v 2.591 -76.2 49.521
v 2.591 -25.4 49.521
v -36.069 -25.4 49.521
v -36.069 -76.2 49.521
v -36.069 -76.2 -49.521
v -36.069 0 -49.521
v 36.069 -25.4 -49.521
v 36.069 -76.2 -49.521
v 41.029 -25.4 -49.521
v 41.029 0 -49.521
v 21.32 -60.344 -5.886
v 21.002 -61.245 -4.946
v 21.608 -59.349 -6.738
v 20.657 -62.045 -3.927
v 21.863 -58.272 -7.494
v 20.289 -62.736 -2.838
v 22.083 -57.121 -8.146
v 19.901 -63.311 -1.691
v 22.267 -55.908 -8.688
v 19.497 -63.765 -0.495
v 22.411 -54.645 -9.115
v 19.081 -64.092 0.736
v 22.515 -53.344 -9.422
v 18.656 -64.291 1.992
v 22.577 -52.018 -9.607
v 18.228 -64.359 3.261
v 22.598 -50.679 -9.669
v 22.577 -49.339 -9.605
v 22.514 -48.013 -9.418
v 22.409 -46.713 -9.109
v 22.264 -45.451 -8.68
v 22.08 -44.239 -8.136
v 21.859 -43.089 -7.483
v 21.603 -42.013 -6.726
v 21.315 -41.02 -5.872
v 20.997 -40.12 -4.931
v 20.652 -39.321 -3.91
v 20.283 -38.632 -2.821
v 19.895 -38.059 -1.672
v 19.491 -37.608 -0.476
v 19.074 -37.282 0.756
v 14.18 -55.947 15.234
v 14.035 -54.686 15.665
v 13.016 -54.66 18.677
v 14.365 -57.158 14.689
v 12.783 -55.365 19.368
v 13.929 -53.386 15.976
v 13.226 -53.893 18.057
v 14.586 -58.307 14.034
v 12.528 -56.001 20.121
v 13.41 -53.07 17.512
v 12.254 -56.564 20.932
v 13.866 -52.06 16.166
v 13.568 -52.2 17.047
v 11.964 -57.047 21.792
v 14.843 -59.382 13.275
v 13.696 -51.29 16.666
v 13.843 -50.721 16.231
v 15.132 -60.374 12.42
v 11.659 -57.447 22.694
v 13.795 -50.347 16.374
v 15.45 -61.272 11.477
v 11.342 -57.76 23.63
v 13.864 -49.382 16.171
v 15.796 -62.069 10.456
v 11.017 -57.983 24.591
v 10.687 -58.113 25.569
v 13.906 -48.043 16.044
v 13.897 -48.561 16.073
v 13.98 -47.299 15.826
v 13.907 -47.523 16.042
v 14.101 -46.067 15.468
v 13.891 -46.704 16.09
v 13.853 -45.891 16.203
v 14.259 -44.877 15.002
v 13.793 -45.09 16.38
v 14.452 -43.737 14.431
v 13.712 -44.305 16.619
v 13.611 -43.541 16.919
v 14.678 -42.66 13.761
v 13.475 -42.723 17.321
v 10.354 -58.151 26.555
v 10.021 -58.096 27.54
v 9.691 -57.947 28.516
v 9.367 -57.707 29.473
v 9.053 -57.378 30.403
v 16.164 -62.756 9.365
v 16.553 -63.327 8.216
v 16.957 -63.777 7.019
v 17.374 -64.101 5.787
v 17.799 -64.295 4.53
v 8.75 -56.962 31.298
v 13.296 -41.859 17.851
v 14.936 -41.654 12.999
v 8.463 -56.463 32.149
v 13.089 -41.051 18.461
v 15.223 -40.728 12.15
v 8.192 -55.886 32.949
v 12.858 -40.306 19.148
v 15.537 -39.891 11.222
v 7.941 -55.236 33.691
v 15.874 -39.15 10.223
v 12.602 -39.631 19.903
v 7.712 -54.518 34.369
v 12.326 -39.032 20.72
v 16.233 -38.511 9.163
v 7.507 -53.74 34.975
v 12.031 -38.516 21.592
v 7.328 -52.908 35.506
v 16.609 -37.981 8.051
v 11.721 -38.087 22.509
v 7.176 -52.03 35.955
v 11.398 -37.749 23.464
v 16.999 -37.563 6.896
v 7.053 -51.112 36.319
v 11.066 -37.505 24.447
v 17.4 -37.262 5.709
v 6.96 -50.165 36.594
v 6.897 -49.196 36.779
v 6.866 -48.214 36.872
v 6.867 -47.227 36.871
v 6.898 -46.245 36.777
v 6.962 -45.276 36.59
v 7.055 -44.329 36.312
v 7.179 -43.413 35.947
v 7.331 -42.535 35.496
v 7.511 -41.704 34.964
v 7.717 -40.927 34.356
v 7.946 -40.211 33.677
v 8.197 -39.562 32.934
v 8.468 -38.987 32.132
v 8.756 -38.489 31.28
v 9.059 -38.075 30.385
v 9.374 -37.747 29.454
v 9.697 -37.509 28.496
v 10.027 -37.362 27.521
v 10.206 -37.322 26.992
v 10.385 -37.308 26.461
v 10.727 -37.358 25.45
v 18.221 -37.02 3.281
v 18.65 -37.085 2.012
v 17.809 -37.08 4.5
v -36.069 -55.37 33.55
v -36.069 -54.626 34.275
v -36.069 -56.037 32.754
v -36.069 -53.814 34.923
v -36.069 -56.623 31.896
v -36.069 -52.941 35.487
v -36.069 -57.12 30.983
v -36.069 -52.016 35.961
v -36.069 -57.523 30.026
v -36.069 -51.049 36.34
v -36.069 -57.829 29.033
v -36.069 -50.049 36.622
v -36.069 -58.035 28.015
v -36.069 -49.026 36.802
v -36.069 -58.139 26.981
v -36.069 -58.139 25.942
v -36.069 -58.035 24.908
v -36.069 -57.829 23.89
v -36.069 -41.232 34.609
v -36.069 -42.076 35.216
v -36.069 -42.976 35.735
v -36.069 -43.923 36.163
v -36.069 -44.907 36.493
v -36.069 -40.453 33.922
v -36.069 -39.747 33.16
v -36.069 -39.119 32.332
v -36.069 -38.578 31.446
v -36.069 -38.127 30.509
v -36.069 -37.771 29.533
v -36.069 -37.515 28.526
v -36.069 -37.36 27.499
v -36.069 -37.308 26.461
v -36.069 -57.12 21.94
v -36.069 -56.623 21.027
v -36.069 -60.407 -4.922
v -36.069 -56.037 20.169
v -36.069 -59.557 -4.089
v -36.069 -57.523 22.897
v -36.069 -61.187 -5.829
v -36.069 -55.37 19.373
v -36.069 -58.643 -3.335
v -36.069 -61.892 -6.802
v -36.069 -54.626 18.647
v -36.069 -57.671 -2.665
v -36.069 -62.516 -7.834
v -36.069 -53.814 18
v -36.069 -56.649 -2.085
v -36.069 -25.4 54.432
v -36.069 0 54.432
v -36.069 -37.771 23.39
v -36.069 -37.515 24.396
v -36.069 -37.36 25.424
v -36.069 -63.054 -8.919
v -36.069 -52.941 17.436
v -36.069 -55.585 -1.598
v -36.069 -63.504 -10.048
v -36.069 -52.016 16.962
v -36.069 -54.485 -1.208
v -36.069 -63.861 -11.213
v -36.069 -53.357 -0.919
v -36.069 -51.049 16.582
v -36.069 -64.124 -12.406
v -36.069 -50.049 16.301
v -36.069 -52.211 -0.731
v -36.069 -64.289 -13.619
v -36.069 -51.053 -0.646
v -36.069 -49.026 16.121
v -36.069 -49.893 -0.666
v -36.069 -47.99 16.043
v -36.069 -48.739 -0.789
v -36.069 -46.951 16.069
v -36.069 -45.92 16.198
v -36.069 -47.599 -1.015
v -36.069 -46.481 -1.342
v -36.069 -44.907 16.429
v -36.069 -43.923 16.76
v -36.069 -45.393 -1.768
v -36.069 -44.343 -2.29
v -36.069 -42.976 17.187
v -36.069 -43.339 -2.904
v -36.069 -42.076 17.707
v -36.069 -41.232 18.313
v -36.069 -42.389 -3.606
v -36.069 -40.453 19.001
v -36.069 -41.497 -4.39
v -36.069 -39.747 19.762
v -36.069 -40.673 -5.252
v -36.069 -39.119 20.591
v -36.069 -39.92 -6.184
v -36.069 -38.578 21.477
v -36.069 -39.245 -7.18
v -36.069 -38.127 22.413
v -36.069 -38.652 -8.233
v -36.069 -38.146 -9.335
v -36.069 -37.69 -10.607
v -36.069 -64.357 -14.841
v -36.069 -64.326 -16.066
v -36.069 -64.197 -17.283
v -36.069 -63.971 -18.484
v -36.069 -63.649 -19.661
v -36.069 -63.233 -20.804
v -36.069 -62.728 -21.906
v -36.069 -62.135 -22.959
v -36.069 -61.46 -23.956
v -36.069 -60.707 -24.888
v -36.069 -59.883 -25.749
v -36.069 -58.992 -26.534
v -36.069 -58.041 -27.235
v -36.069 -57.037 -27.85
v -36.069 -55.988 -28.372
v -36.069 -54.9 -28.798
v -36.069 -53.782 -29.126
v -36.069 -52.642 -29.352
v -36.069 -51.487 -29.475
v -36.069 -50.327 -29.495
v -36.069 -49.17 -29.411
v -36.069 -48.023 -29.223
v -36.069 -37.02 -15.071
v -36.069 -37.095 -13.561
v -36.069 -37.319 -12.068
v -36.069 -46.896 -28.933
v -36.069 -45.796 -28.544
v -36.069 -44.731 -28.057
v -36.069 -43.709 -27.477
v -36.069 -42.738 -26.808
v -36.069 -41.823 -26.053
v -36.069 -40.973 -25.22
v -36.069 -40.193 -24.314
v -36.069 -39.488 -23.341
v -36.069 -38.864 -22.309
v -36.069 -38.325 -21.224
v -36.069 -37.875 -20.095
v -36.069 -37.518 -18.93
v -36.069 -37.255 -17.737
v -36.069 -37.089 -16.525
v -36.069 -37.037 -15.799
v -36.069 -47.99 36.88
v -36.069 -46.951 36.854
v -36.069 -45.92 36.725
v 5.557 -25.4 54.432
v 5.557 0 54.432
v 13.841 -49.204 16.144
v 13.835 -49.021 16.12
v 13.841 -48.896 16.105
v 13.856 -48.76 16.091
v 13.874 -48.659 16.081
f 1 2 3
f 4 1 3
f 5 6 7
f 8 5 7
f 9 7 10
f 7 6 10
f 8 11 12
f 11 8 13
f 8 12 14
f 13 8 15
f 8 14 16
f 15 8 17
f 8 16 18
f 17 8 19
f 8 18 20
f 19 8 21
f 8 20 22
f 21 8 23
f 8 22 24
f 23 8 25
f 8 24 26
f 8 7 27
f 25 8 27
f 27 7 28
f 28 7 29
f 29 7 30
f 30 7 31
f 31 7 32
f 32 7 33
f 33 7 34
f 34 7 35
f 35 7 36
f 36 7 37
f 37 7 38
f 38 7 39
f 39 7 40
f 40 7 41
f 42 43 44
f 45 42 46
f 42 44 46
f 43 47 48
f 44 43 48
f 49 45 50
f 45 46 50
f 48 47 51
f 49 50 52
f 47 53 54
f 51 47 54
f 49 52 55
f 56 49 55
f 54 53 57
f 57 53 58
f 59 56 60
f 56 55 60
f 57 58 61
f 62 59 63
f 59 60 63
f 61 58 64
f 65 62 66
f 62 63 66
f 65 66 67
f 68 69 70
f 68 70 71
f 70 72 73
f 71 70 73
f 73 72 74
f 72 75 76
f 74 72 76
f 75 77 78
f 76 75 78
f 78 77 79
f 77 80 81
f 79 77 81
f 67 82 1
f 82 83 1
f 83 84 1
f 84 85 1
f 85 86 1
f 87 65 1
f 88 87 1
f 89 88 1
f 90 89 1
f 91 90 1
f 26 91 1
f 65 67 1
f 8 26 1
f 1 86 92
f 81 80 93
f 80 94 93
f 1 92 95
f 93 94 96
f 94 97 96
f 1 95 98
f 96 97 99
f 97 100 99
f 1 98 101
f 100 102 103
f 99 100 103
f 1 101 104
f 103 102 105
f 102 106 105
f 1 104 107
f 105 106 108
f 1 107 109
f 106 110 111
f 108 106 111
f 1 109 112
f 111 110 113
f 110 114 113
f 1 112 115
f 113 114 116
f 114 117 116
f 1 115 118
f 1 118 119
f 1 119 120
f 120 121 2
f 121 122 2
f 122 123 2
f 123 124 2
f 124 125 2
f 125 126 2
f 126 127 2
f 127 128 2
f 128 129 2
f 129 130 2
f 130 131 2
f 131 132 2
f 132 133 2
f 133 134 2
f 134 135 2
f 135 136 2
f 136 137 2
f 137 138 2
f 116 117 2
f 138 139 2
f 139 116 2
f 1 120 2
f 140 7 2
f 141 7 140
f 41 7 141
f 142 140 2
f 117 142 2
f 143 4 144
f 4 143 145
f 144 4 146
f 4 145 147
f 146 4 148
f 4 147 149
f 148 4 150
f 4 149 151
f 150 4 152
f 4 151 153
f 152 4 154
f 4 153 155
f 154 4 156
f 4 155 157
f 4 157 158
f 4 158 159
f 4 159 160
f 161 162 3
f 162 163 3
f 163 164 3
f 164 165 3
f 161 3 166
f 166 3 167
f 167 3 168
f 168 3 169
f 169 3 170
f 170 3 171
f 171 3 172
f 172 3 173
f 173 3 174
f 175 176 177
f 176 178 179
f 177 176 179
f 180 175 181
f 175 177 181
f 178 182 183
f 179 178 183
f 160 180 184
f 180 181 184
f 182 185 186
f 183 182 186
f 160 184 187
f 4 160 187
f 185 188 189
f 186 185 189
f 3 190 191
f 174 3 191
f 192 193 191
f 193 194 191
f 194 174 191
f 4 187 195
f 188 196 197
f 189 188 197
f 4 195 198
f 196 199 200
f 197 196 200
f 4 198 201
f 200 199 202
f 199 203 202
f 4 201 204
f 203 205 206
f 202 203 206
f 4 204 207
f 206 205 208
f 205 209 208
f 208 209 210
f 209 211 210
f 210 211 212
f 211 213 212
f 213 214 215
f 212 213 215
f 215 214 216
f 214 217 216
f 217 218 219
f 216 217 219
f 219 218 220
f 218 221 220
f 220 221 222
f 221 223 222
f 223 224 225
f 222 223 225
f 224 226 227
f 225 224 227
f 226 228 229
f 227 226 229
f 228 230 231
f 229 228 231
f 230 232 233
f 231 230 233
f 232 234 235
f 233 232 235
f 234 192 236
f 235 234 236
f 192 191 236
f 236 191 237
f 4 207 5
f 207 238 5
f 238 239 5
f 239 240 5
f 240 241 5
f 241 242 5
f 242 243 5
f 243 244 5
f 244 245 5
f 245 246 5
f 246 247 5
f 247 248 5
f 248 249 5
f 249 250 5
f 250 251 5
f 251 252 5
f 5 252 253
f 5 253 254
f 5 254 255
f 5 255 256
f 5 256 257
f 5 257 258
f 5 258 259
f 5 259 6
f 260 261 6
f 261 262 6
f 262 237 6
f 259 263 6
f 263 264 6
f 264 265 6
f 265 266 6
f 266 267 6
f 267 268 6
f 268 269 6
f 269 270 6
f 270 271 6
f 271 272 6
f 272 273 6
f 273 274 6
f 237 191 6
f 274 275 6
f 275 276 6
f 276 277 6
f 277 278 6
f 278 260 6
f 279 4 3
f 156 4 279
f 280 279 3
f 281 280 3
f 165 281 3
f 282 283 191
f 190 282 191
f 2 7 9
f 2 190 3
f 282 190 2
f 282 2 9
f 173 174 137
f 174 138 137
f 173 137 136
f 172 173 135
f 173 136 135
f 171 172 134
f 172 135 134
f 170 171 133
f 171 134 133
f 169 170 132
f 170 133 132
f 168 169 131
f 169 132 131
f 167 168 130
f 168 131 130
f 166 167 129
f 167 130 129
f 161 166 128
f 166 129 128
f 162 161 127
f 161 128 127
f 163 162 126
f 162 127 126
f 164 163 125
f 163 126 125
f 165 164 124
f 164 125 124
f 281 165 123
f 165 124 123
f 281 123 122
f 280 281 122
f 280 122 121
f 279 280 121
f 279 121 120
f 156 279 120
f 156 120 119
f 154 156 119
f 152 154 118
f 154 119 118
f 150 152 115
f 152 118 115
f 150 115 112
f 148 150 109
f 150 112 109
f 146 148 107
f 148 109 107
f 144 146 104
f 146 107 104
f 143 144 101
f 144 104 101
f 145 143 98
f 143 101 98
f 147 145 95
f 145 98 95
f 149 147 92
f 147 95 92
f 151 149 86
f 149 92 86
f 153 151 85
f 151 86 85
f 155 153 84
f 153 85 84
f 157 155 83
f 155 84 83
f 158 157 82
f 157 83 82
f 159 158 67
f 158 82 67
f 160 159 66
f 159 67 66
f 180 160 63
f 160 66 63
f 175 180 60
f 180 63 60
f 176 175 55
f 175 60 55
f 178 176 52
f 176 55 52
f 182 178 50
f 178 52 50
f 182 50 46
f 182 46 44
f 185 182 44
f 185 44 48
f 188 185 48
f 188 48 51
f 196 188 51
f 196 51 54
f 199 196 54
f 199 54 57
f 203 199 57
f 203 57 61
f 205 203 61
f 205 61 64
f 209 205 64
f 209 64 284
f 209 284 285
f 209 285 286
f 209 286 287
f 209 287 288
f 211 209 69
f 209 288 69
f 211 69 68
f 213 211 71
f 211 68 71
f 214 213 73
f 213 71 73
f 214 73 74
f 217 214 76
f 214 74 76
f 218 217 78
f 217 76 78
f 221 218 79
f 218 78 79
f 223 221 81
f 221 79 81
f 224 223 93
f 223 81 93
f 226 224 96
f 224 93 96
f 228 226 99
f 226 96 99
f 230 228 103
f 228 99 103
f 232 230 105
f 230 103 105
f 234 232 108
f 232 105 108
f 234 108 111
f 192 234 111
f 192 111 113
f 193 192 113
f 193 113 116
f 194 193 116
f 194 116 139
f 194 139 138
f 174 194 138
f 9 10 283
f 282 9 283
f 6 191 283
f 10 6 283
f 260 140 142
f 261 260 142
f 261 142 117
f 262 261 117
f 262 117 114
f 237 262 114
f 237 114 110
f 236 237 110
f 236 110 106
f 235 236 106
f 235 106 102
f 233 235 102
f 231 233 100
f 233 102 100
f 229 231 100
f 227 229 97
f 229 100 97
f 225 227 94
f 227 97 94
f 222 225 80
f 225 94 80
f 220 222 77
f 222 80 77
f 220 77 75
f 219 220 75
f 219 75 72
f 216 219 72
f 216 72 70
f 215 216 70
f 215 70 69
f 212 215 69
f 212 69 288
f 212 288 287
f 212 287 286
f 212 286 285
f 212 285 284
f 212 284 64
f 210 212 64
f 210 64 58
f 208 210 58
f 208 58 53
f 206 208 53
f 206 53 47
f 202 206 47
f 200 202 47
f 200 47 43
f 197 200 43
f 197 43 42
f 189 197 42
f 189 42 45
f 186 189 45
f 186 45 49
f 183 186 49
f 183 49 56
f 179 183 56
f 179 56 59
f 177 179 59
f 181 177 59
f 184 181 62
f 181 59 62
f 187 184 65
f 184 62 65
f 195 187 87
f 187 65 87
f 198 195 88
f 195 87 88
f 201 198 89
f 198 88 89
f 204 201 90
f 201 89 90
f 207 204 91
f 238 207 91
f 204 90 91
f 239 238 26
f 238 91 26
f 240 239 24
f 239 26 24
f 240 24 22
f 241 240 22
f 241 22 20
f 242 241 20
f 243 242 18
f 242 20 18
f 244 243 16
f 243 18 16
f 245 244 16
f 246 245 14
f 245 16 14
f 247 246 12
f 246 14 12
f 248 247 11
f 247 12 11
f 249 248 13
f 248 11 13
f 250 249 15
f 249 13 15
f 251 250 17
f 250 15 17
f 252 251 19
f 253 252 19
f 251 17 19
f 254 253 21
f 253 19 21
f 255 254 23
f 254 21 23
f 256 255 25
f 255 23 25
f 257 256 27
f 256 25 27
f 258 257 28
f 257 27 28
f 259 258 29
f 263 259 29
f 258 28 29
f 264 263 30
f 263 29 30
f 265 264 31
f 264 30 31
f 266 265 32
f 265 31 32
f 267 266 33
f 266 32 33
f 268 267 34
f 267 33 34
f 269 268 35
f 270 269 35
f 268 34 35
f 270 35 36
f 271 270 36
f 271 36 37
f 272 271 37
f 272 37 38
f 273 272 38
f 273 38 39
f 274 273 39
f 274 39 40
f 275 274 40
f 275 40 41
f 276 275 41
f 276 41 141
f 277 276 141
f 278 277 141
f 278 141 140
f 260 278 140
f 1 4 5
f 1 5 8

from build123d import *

# Parameters (mm, degrees)
F1_DEPTH      = 76.2
F2_DEPTH      = 25.4
F3_R          = 13.6695760471
F4_DEPTH      = 120.65
F5_R          = 10.4216060464
F6_DEPTH      = 108.204
F6_DEPTH_BACK = 97.028


with BuildPart() as f1:
    # F0 (on Front) → F1 (new body)
    with BuildSketch(Plane.XZ):
        Polygon((36.0692664981, -49.5205111802), (2.5906101801, 49.5205111802), (-36.0692664981, 49.5205111802), (-36.0692664981, -49.5205111802), align=None)
    extrude(amount=F1_DEPTH)

    # F0 (on Front) → F2 (join)
    with BuildSketch(Plane.XZ):
        Polygon((36.0692664981, -49.5205111802), (2.5906101801, 49.5205111802), (-36.0692664981, 49.5205111802), (-36.0692664981, -49.5205111802), align=None)
        Polygon((-36.0692664981, 49.5205111802), (2.5906101801, 49.5205111802), (36.0692664981, -49.5205111802), (41.0287082195, -49.5205111802), (5.5572725832, 54.4315949082), (-36.0692664981, 54.4315949082), align=None)
    extrude(amount=F2_DEPTH)

    # F3 (on face) → F4 (cut)
    with BuildSketch(Plane(origin=(17.3477334247, 0, 5.8640227189), x_dir=(0, 1, 0), z_dir=(0.9473405682, 0, 0.3202278061))):
        with Locations((-50.689227879, -2.7265385725)):
            Circle(F3_R)
    extrude(amount=-F4_DEPTH, mode=Mode.SUBTRACT)

    # F5 (on Right) → F6 (cut, two sides)
    with BuildSketch(Plane.YZ) as f6_sk:
        with Locations((-47.7300770581, 26.4613311738)):
            Circle(F5_R)
    extrude(amount=F6_DEPTH, mode=Mode.SUBTRACT)
    extrude(f6_sk.sketch, amount=-F6_DEPTH_BACK, mode=Mode.SUBTRACT)


solid = f1.part
